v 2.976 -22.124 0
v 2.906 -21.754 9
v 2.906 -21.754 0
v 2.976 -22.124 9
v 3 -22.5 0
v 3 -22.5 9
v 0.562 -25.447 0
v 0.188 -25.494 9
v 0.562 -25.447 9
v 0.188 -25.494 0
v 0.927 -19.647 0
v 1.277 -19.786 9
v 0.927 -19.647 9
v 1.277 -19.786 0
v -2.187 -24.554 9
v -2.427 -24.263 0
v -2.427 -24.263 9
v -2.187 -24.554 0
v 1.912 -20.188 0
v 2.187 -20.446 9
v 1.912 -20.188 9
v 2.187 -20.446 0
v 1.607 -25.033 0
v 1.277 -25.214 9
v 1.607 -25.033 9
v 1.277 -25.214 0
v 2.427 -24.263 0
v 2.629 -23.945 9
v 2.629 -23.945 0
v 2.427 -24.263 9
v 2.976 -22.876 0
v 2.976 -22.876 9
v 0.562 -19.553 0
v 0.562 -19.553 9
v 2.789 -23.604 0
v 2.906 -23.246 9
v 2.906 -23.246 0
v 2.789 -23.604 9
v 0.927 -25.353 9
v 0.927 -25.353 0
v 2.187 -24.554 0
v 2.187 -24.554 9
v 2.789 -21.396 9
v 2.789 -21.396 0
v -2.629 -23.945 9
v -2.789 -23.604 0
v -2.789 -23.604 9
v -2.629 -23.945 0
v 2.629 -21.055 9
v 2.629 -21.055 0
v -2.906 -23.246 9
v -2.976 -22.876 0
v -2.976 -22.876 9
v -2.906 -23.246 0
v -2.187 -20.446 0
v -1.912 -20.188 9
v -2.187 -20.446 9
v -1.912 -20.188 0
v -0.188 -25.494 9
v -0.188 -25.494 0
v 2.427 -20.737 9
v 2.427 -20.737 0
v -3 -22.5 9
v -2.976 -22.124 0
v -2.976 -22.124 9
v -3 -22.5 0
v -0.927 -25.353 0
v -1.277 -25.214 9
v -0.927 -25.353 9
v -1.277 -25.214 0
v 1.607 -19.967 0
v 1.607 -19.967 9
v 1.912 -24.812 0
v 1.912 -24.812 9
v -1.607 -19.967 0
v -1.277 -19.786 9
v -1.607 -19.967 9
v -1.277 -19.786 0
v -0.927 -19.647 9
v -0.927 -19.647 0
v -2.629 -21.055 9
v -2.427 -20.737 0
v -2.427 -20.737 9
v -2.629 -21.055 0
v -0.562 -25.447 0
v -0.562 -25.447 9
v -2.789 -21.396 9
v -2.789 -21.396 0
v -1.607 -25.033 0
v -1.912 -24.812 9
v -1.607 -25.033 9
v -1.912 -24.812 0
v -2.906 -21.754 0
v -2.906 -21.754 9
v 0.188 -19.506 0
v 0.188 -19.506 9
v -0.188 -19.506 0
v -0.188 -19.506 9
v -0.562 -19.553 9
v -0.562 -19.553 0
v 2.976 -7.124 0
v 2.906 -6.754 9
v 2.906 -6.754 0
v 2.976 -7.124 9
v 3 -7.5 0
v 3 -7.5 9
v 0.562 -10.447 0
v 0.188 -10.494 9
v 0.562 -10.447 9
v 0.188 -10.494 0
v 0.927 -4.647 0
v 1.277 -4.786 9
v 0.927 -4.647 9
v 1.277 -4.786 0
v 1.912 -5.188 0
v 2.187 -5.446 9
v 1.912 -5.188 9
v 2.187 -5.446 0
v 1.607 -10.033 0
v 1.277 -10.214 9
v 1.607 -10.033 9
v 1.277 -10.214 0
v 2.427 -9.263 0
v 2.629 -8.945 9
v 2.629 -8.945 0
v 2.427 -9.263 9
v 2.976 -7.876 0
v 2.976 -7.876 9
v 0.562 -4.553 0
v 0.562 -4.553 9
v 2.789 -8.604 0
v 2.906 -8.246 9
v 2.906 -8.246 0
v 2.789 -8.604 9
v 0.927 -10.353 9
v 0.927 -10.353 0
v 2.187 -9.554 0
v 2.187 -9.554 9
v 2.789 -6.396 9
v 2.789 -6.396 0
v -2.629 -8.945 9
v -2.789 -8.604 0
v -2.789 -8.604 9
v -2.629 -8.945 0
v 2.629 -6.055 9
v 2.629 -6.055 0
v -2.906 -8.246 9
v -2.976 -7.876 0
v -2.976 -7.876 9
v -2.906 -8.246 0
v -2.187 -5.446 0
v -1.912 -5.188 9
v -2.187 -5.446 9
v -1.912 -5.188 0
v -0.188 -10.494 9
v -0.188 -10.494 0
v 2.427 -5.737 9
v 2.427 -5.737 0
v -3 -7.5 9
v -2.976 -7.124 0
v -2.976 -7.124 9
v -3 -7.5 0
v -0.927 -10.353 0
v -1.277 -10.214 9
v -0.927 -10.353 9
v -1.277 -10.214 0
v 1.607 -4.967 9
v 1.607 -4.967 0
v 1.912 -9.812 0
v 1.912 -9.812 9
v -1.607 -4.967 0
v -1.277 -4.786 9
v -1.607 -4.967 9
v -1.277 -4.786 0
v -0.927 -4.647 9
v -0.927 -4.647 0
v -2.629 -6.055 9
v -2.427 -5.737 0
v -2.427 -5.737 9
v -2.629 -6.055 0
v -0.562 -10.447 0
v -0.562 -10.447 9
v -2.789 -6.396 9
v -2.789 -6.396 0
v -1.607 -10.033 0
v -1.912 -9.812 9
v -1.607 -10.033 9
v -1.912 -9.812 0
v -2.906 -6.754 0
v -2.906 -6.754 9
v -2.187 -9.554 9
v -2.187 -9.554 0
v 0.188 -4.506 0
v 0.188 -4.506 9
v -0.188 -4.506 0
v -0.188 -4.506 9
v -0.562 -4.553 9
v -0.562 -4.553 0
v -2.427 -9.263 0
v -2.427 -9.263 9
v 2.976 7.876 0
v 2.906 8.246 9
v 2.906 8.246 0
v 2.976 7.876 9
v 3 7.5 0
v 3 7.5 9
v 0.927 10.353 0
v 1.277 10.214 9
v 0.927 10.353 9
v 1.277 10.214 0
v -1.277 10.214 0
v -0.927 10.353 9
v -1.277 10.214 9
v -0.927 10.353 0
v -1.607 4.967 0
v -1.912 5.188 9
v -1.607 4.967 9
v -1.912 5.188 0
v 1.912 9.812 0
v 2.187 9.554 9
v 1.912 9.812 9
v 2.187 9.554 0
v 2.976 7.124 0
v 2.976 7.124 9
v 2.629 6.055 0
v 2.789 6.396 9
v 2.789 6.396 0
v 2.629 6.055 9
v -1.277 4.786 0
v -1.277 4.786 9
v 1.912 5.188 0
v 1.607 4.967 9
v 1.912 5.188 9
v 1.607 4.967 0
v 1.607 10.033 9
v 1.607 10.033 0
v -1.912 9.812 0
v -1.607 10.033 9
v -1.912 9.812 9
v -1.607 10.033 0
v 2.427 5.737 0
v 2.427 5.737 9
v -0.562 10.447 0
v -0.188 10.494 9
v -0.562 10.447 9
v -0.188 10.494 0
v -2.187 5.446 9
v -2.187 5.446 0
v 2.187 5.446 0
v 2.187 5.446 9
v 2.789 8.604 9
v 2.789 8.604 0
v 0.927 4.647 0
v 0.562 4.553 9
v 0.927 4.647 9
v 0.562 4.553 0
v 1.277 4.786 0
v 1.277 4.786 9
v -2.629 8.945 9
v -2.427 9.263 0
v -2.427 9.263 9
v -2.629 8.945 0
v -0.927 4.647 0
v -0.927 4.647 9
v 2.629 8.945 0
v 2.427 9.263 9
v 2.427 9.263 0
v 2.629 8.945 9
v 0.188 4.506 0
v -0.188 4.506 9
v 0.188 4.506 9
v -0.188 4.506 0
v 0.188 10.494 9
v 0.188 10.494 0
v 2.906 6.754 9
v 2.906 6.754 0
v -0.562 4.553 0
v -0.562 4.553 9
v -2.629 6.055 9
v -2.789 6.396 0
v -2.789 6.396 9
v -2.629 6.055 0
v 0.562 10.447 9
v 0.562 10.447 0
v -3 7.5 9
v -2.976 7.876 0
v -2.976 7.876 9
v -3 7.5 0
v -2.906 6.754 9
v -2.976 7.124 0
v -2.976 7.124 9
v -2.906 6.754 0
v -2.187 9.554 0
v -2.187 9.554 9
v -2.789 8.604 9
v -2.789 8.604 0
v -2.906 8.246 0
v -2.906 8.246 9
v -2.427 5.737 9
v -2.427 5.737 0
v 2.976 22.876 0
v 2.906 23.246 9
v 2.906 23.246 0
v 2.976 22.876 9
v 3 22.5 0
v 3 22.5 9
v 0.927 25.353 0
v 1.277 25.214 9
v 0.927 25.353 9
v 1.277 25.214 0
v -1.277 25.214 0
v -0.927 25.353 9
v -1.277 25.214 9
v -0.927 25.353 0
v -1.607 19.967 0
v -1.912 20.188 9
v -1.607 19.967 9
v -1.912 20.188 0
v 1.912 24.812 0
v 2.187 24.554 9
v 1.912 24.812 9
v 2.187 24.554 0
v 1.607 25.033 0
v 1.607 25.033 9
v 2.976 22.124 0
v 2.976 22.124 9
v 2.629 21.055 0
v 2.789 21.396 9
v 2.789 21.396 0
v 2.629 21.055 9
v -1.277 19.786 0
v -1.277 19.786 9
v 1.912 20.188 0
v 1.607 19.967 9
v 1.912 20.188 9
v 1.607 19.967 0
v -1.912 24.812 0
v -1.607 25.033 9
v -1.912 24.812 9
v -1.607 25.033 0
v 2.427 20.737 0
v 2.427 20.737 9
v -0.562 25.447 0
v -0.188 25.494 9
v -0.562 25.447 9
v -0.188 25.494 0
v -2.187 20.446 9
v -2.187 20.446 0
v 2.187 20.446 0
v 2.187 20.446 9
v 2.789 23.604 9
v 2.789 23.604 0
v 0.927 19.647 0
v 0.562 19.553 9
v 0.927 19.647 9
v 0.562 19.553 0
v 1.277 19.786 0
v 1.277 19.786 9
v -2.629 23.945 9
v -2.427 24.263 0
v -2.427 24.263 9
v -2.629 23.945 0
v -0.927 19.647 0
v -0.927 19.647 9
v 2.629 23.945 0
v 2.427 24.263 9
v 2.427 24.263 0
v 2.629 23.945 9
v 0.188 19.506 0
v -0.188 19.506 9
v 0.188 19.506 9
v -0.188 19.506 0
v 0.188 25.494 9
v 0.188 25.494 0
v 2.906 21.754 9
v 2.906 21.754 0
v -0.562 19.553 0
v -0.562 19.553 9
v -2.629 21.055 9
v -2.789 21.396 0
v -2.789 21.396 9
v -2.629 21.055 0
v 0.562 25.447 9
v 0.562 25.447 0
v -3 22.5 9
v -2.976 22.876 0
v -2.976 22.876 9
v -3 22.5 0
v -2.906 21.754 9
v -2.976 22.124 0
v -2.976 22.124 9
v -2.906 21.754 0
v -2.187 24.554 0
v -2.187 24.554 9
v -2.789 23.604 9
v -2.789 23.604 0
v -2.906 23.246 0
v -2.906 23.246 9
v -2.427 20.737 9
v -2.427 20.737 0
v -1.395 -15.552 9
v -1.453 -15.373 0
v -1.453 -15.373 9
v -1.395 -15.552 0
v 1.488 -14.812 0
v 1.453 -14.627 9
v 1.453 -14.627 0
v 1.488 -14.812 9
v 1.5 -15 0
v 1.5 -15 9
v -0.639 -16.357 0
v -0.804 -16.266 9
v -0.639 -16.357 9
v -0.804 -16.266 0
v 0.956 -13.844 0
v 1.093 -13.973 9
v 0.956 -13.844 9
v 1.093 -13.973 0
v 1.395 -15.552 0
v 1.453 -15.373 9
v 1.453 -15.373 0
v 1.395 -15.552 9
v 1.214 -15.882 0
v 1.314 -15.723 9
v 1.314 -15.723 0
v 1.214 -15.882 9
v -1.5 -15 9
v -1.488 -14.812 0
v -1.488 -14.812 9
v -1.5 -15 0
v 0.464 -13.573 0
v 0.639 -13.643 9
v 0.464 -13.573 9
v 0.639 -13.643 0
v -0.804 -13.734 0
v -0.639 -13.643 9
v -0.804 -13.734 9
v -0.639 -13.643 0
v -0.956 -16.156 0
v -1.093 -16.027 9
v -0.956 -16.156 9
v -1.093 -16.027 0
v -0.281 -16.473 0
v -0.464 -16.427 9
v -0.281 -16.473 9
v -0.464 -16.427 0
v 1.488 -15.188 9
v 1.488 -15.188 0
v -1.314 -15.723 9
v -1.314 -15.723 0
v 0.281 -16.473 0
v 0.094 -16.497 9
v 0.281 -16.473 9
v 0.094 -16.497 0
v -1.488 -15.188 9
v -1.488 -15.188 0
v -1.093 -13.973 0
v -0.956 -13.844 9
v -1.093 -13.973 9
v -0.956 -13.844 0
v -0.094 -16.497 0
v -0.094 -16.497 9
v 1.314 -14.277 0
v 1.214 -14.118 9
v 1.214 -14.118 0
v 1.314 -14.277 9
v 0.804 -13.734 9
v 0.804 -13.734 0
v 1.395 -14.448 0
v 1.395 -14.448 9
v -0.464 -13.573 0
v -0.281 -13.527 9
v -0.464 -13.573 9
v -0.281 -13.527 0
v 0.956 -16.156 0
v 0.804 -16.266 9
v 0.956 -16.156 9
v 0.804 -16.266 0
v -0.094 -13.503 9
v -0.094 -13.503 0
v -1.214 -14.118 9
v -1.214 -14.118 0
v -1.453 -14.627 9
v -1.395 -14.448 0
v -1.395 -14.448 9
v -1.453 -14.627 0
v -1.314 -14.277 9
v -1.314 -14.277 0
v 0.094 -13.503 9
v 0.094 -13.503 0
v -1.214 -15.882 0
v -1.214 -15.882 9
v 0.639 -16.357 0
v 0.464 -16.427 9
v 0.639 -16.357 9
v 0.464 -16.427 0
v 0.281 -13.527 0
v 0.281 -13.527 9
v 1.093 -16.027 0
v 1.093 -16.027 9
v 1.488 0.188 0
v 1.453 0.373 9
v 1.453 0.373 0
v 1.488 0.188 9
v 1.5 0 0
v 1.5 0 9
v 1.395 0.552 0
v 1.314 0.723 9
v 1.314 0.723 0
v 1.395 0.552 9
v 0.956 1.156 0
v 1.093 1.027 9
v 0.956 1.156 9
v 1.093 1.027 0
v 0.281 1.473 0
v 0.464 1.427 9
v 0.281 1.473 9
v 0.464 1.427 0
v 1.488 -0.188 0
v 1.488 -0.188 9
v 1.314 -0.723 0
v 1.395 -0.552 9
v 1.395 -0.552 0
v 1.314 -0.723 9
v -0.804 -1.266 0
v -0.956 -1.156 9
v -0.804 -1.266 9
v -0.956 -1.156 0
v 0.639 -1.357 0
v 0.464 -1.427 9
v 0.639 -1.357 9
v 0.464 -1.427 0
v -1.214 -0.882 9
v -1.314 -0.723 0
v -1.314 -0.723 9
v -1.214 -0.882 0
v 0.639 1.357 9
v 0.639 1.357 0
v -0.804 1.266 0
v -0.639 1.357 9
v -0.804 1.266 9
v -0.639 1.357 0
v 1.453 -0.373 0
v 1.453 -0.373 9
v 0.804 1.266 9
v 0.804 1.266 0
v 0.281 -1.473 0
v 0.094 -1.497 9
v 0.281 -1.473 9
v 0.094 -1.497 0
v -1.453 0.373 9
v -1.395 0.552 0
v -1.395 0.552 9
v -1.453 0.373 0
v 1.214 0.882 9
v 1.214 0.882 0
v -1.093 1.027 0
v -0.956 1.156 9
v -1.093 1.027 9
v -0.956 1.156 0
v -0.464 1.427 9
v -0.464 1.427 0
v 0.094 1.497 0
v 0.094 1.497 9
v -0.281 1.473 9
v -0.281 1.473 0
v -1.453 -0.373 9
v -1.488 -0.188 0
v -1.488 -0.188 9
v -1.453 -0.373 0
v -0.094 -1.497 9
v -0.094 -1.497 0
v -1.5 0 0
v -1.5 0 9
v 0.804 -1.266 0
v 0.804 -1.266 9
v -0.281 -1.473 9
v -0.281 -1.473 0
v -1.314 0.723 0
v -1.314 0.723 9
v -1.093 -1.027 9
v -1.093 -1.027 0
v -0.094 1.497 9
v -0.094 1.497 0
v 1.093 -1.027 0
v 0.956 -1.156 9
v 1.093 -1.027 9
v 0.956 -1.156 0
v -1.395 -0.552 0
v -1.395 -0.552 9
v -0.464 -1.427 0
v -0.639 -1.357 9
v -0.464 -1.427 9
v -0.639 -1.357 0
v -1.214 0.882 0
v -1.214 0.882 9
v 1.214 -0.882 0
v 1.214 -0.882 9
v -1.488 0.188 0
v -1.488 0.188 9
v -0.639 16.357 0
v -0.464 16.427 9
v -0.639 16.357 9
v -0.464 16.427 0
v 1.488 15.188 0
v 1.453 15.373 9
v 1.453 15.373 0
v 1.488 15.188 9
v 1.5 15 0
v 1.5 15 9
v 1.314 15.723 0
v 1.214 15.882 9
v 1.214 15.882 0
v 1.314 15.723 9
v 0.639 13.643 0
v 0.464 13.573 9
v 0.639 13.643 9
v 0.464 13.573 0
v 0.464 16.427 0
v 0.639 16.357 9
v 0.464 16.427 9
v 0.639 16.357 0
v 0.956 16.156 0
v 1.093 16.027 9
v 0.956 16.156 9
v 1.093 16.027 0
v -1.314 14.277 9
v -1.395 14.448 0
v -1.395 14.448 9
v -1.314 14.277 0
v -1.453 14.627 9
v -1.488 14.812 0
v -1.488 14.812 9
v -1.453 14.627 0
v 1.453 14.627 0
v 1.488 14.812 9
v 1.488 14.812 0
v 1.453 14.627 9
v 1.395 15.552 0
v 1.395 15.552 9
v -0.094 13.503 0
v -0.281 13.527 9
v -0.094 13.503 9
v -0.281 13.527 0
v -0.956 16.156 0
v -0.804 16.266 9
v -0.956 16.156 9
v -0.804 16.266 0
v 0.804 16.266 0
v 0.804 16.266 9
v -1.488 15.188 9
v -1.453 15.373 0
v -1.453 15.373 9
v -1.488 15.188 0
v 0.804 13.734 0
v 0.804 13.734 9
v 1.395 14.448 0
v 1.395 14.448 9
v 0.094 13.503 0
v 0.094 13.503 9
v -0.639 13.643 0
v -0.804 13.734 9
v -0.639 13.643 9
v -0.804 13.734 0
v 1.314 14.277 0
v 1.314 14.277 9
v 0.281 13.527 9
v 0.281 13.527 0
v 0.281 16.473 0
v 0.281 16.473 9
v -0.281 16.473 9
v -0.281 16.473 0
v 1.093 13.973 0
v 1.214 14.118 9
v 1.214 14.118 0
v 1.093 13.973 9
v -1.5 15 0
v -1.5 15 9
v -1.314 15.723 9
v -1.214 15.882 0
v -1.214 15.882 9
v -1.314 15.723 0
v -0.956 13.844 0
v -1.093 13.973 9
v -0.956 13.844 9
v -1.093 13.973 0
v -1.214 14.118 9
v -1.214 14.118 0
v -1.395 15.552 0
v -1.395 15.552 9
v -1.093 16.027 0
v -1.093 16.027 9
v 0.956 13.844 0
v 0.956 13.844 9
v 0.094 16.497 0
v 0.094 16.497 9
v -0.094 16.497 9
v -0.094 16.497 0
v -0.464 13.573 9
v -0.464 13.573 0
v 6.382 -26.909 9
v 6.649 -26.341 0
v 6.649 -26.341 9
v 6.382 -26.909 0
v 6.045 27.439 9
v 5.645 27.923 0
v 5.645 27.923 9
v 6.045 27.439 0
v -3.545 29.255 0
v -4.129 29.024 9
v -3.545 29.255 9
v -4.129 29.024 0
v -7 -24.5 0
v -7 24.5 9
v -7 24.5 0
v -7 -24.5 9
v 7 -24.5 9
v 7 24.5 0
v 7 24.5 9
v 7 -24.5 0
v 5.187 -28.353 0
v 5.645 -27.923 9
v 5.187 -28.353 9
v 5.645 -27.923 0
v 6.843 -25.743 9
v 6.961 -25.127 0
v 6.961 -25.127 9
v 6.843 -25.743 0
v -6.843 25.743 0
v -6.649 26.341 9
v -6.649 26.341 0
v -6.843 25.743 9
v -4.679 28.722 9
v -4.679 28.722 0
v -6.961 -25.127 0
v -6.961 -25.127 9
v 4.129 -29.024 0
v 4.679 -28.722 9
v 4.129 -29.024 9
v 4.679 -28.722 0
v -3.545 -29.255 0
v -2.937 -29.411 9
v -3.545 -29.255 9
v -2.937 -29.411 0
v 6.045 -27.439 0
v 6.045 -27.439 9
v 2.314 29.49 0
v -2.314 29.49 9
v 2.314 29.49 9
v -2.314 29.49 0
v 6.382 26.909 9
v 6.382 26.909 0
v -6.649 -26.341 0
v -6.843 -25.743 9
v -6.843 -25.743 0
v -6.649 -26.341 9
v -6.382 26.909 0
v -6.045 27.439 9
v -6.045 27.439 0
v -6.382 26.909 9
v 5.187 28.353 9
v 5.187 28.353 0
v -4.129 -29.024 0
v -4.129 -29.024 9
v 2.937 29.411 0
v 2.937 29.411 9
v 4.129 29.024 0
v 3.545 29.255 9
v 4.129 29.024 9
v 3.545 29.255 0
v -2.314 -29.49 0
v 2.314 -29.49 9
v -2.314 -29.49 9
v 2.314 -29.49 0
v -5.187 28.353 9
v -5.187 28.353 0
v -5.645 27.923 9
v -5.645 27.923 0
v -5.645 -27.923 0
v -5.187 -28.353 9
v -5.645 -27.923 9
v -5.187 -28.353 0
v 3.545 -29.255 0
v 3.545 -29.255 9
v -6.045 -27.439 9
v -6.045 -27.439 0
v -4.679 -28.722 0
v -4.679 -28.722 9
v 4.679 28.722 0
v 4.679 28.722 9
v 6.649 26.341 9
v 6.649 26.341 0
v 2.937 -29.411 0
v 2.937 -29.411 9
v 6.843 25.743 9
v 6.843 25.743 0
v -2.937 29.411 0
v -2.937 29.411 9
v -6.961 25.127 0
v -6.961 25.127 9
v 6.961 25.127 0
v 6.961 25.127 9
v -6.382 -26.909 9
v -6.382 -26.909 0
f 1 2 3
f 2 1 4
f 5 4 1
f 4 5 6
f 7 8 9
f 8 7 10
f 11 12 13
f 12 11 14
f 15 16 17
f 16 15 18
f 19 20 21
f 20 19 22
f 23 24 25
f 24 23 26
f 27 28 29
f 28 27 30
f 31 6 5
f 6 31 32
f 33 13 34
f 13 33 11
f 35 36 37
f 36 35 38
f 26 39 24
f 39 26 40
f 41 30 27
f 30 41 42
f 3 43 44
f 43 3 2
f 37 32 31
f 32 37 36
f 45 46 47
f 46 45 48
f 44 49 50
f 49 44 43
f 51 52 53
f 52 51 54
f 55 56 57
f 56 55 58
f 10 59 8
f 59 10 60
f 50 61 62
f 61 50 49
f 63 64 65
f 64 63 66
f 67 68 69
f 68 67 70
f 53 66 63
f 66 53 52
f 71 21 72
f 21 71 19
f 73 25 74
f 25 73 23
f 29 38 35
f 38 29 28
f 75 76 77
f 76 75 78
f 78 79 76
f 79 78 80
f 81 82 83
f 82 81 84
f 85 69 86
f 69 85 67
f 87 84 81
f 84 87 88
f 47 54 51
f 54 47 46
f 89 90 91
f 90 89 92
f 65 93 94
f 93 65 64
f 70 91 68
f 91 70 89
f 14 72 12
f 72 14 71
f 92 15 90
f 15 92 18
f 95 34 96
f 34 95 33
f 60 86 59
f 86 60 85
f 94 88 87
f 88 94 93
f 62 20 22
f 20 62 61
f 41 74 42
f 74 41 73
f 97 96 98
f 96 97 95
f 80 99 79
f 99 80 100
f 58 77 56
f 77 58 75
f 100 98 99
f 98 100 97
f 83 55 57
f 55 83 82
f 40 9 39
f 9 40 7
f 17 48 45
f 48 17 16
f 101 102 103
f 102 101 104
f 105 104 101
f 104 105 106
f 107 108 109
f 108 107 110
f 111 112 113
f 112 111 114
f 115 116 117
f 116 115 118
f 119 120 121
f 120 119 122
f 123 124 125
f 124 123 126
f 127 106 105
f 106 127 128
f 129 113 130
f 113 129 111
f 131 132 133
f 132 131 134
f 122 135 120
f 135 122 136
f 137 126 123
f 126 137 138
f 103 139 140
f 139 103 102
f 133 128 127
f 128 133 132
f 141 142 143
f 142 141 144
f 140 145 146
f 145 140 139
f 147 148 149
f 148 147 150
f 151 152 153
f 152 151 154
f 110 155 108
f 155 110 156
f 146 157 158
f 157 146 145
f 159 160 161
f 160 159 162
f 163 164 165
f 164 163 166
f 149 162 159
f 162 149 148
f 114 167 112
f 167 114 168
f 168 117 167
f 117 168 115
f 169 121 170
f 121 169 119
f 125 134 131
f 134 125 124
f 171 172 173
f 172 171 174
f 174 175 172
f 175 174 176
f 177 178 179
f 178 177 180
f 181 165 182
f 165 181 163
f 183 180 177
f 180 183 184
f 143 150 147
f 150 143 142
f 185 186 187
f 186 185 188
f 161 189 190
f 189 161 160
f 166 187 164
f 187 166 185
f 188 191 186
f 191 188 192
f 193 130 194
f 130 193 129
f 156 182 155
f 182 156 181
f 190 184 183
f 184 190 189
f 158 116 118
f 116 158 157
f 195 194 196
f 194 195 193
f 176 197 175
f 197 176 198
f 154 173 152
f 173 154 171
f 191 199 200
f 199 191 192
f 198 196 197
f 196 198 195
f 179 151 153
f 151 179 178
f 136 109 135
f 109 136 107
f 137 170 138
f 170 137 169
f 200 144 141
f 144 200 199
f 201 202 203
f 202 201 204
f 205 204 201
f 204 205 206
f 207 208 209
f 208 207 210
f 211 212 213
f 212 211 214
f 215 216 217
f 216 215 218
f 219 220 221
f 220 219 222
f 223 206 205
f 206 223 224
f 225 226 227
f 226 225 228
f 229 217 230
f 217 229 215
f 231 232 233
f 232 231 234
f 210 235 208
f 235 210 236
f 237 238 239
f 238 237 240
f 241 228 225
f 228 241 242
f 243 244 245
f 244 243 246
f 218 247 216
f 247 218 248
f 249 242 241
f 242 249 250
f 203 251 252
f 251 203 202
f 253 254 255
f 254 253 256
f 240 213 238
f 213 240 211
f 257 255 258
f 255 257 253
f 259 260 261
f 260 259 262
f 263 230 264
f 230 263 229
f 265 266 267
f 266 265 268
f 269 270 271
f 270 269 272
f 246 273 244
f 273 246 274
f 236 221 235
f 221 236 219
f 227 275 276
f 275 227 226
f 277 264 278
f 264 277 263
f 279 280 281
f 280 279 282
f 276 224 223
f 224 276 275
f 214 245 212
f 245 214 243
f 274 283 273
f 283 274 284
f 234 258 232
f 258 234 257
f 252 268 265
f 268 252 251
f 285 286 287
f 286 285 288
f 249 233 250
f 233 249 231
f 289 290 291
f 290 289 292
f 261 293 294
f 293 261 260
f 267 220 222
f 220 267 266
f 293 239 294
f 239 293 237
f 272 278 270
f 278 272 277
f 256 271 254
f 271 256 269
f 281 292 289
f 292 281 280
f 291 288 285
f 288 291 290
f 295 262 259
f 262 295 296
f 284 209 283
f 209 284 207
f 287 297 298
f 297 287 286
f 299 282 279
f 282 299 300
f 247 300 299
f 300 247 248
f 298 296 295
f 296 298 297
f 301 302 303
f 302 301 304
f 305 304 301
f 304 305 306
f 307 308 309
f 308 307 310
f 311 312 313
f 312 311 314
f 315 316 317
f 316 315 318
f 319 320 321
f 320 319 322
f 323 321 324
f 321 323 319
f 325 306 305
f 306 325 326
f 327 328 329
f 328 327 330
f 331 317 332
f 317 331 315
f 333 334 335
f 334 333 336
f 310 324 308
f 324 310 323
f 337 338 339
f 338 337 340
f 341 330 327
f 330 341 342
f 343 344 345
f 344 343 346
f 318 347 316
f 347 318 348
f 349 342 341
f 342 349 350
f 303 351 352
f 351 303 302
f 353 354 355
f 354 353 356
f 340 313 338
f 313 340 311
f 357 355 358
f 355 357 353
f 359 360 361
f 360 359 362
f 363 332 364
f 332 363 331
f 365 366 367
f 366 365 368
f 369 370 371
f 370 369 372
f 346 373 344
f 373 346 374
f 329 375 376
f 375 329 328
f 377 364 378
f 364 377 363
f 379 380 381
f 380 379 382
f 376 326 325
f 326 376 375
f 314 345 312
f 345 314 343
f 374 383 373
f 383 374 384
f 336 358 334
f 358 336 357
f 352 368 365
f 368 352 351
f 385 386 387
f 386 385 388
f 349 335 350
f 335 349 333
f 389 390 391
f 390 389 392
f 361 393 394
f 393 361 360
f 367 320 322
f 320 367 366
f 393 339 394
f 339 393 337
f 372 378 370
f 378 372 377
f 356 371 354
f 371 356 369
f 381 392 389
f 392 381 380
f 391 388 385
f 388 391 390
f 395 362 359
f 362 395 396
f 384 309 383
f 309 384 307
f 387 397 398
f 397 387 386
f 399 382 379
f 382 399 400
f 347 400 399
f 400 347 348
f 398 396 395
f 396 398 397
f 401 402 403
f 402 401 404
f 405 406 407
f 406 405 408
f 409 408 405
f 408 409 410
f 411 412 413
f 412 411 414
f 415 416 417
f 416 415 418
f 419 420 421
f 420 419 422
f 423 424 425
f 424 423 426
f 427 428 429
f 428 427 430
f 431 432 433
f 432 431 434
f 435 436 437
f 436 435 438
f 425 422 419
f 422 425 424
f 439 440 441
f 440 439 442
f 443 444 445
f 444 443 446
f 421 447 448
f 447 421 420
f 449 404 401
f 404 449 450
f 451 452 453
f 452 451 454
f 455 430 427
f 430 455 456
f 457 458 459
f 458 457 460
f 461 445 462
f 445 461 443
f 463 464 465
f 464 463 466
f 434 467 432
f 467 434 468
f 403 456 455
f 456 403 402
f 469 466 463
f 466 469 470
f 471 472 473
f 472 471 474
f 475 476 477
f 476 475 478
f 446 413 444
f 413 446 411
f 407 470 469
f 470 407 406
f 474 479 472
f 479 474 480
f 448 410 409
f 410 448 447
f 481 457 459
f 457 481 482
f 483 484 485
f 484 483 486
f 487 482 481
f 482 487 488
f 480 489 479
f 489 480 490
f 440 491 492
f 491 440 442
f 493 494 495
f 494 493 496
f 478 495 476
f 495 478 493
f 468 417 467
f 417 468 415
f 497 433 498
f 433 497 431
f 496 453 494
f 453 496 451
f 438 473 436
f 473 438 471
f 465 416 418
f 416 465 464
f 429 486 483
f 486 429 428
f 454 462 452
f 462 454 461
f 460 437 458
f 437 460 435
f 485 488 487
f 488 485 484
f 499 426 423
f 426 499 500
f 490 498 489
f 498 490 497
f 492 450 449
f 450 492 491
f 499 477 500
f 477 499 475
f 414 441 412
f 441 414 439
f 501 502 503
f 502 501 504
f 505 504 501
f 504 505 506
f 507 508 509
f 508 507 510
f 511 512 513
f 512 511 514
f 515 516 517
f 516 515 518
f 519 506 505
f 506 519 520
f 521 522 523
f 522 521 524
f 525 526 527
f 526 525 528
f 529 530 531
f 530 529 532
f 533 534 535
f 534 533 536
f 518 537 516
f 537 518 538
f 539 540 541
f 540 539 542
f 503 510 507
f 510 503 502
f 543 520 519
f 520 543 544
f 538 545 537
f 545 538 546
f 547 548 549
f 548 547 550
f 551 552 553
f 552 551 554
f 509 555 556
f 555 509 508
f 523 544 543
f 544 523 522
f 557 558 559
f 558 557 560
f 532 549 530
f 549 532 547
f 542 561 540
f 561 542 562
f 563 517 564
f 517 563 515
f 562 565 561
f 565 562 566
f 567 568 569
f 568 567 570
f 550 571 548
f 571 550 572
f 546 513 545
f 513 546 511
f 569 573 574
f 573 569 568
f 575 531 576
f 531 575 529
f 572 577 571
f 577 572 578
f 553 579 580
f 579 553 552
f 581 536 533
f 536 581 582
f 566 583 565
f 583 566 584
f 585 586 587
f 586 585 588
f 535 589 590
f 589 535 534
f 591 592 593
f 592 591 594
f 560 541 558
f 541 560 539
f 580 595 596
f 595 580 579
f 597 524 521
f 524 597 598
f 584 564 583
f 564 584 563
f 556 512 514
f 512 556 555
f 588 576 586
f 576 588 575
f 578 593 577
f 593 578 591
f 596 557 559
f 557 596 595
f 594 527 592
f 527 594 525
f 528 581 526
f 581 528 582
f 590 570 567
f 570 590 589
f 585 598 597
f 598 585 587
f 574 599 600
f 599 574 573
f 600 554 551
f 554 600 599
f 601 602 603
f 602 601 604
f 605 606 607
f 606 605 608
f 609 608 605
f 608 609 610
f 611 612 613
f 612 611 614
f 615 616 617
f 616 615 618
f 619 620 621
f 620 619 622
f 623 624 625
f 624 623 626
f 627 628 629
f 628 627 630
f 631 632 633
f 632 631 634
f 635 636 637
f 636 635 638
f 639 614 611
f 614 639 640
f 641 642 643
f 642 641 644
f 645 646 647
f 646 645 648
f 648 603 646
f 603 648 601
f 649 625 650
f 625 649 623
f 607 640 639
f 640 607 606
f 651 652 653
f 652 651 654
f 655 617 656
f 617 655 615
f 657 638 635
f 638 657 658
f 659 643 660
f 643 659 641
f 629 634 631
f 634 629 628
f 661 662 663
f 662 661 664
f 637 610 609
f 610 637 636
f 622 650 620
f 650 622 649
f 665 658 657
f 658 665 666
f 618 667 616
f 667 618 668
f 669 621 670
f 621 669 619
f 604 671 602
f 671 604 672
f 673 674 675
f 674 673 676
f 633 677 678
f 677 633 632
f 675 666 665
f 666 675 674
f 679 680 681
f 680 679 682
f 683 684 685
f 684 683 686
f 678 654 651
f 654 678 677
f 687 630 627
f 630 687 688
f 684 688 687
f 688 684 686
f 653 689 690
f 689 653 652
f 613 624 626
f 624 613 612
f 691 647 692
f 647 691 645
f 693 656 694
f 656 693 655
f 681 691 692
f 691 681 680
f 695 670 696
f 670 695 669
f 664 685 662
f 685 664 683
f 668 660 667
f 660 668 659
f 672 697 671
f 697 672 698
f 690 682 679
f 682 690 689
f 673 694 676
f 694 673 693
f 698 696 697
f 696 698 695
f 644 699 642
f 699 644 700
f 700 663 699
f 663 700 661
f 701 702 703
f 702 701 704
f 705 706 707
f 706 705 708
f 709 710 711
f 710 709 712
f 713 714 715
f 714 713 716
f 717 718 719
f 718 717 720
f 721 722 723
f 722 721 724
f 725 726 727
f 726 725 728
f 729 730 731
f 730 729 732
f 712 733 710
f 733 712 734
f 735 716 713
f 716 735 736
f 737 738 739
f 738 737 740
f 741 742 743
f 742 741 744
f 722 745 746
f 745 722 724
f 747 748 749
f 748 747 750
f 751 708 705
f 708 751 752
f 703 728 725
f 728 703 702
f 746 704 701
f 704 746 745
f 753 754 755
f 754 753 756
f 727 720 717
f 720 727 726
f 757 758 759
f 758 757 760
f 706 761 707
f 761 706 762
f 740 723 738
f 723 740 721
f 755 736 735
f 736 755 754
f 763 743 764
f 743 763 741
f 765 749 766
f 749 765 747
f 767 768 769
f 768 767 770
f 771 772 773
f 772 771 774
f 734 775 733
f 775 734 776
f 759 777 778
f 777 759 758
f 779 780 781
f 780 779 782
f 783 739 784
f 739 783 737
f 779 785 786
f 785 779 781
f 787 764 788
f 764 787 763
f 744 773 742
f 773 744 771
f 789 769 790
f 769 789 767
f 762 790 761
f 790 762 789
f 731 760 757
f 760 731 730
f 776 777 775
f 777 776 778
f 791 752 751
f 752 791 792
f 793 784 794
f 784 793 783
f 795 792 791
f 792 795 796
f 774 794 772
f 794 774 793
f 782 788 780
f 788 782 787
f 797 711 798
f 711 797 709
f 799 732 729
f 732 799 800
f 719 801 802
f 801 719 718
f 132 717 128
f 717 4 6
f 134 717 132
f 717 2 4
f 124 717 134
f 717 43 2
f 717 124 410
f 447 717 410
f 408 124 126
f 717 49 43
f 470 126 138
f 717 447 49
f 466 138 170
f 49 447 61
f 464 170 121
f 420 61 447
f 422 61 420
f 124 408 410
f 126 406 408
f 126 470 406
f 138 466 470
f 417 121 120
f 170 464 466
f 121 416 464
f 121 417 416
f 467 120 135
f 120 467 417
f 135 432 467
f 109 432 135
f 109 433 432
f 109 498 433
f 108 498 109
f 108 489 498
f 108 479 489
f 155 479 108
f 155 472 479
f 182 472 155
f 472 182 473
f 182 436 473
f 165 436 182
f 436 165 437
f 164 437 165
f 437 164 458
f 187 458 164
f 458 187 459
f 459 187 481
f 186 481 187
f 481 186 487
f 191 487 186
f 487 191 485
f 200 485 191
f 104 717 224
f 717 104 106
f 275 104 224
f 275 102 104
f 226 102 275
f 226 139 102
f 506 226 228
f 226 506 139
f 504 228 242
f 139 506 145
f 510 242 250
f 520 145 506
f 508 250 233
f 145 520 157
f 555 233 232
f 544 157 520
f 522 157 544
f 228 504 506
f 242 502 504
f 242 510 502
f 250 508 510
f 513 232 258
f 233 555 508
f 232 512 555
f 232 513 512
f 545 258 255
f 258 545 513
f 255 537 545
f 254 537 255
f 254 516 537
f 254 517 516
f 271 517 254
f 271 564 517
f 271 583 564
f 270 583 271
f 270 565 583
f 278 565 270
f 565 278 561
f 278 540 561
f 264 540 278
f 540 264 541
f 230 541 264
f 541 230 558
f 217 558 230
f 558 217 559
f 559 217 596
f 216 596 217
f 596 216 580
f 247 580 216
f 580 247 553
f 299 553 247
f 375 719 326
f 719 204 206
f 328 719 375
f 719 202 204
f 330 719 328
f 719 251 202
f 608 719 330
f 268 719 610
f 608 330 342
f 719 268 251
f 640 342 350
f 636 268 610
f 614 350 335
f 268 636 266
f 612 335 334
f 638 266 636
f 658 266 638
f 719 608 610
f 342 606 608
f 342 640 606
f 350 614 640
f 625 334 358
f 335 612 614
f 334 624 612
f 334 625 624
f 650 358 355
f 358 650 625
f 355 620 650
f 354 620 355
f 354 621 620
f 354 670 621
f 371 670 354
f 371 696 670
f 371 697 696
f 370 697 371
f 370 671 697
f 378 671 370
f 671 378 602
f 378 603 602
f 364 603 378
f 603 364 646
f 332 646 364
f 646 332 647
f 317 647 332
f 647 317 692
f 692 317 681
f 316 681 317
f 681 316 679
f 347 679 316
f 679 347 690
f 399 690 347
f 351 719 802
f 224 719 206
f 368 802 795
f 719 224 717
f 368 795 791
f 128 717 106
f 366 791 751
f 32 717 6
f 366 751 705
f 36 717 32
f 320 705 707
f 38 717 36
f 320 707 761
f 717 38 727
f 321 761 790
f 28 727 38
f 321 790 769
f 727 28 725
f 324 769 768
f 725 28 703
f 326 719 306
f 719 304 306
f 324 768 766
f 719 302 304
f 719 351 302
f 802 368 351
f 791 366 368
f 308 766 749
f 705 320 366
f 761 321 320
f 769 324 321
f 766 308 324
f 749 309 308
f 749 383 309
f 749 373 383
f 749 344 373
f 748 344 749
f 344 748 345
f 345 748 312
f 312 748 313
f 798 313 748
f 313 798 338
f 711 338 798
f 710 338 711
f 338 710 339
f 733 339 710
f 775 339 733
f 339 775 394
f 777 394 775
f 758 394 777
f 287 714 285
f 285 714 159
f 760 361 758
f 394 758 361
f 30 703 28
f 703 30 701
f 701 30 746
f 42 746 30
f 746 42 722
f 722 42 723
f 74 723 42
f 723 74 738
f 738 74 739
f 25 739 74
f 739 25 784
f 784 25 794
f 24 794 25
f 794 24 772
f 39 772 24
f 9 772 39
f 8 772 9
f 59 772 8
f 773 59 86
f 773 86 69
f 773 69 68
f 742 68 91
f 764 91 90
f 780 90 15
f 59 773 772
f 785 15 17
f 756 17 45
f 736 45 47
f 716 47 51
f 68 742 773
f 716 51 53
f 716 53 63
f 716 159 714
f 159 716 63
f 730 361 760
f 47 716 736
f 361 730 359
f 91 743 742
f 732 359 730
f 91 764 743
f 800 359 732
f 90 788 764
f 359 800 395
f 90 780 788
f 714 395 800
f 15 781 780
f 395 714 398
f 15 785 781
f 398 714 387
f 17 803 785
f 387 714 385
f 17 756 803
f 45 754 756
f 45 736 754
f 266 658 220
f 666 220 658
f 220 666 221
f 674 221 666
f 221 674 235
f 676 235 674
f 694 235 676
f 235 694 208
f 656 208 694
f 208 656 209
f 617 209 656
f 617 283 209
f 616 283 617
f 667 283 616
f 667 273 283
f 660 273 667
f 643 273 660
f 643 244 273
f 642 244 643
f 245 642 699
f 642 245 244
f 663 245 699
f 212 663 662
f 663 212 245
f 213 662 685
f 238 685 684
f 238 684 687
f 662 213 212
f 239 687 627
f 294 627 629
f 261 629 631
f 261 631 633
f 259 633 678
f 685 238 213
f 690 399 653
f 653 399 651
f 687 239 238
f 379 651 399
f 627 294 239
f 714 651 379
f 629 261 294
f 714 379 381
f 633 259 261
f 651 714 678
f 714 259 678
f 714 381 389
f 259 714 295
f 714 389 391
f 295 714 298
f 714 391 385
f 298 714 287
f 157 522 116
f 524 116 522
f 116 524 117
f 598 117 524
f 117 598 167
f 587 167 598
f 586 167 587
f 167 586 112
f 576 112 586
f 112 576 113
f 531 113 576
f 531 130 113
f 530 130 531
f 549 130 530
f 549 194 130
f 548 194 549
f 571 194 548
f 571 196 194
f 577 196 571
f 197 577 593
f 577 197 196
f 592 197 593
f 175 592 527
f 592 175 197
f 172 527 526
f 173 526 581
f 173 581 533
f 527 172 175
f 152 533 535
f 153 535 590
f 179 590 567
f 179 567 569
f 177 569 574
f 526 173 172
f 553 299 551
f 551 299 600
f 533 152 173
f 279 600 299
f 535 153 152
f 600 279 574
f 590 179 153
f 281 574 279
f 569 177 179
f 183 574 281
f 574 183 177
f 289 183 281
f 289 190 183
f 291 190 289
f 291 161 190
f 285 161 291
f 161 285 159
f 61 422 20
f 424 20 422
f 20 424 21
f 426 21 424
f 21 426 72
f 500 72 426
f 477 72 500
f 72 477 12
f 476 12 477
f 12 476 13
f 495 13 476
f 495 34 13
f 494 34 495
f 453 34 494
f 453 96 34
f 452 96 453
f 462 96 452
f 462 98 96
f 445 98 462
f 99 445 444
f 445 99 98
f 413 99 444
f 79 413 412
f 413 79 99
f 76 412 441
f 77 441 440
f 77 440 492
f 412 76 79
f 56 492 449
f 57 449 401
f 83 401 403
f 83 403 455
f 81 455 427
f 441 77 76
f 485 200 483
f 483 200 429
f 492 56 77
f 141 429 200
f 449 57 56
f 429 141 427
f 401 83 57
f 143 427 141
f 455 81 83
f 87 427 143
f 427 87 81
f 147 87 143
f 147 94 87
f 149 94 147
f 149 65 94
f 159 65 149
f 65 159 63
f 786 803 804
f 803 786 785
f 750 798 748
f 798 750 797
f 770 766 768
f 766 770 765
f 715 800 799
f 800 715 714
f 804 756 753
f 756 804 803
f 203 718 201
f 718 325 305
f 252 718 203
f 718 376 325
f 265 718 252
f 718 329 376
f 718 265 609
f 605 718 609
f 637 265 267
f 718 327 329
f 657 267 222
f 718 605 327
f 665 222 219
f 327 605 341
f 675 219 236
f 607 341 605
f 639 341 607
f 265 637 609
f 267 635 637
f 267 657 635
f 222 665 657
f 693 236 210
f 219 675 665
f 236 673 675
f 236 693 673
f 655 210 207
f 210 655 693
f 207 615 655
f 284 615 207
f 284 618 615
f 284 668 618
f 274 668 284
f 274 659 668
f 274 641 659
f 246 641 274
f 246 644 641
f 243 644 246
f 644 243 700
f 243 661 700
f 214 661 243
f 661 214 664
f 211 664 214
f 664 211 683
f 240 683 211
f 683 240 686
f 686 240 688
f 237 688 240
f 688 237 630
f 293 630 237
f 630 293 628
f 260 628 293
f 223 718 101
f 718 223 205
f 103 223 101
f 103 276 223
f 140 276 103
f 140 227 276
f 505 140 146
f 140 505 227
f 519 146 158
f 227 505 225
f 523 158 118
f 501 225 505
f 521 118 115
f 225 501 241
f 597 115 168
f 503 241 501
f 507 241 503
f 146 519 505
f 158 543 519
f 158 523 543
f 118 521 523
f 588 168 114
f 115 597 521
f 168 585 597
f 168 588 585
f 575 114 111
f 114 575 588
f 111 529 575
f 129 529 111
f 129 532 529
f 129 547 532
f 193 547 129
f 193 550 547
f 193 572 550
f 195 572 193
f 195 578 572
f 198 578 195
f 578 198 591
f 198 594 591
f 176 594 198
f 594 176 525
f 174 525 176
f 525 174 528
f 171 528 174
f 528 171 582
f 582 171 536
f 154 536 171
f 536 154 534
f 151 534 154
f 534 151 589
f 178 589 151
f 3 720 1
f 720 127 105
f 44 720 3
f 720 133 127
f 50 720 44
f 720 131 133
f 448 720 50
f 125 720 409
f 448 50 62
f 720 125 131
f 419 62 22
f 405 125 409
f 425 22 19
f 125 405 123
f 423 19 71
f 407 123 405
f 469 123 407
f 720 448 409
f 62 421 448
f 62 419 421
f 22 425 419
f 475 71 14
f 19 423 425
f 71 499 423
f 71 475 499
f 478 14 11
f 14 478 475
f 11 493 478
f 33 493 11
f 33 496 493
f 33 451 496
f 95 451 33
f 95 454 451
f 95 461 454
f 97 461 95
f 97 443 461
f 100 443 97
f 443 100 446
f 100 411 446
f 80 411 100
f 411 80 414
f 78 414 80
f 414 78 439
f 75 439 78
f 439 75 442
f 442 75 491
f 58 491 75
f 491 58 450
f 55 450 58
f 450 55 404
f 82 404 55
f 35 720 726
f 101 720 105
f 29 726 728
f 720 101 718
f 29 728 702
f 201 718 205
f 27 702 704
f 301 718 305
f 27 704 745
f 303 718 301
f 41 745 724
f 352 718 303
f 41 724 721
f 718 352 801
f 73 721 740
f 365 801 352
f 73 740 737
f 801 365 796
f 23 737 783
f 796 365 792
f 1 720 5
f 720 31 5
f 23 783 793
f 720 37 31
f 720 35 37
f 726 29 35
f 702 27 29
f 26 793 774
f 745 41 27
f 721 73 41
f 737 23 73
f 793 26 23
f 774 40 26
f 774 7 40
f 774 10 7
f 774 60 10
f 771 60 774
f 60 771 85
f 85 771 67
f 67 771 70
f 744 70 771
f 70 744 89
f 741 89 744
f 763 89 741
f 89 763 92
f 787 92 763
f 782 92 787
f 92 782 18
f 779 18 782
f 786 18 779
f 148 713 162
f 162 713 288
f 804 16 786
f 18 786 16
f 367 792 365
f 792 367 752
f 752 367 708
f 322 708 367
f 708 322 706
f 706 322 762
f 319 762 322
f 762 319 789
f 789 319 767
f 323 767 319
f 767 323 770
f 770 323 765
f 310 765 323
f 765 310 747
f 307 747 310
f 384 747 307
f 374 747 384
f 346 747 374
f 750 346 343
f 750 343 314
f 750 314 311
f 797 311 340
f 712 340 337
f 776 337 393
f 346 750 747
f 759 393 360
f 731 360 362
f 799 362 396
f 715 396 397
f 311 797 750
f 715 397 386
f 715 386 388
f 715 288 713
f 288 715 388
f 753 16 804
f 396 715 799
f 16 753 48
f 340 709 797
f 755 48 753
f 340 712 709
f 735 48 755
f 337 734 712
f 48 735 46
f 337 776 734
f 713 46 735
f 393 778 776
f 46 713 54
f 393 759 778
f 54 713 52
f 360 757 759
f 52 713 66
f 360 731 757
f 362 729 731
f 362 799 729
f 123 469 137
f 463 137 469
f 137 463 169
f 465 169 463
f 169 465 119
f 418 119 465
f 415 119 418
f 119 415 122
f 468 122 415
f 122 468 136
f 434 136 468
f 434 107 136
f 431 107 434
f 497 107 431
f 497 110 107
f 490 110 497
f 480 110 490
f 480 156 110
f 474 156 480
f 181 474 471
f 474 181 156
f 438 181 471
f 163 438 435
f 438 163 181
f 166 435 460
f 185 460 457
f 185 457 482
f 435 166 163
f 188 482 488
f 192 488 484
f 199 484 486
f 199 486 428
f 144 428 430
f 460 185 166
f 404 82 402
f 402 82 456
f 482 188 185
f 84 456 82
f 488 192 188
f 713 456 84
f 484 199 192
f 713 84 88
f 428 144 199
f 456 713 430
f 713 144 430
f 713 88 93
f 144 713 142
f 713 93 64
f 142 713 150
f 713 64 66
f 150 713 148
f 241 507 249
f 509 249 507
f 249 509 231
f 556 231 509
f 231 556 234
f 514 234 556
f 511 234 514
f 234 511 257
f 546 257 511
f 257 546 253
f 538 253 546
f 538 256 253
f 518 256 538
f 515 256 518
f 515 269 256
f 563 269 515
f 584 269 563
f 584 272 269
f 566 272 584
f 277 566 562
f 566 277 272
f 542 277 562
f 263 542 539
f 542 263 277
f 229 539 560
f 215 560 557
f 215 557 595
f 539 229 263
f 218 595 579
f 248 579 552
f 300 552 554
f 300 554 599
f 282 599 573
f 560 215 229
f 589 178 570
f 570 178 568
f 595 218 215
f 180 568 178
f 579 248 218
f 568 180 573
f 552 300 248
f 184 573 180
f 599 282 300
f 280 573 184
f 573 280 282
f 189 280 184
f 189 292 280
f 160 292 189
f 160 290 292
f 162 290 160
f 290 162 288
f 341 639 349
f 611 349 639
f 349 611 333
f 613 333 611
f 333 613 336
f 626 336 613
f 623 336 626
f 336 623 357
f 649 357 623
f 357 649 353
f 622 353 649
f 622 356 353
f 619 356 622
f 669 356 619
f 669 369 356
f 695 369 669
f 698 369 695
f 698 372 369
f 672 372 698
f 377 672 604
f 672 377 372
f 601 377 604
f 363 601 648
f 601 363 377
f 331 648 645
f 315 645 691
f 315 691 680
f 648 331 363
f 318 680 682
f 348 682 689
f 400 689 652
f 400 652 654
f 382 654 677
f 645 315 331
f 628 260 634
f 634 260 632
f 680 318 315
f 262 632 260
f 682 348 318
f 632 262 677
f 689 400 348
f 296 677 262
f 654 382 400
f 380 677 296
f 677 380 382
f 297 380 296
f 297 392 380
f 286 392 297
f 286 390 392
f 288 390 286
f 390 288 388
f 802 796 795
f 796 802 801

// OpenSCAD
$fn = 50;

difference() {
	union() {
		hull() {
			translate(v = [-2.0, 24.5, 0]) {
				cylinder(h = 9, r = 5);
			}
			translate(v = [2.0, 24.5, 0]) {
				cylinder(h = 9, r = 5);
			}
			translate(v = [-2.0, -24.5, 0]) {
				cylinder(h = 9, r = 5);
			}
			translate(v = [2.0, -24.5, 0]) {
				cylinder(h = 9, r = 5);
			}
		}
	}
	union() {
		translate(v = [0.0, -22.5, 0]) {
			translate(v = [0, 0, -100]) {
				cylinder(h = 200, r = 3.0);
			}
		}
		translate(v = [0.0, -7.5, 0]) {
			translate(v = [0, 0, -100]) {
				cylinder(h = 200, r = 3.0);
			}
		}
		translate(v = [0.0, 7.5, 0]) {
			translate(v = [0, 0, -100]) {
				cylinder(h = 200, r = 3.0);
			}
		}
		translate(v = [0.0, 22.5, 0]) {
			translate(v = [0, 0, -100]) {
				cylinder(h = 200, r = 3.0);
			}
		}
		translate(v = [0.0, -22.5, 0]) {
			translate(v = [0, 0, -100]) {
				cylinder(h = 200, r = 1.5);
			}
		}
		translate(v = [0.0, -15.0, 0]) {
			translate(v = [0, 0, -100]) {
				cylinder(h = 200, r = 1.5);
			}
		}
		translate(v = [0.0, -7.5, 0]) {
			translate(v = [0, 0, -100]) {
				cylinder(h = 200, r = 1.5);
			}
		}
		translate(v = [0, 0, -100]) {
			cylinder(h = 200, r = 1.5);
		}
		translate(v = [0.0, 7.5, 0]) {
			translate(v = [0, 0, -100]) {
				cylinder(h = 200, r = 1.5);
			}
		}
		translate(v = [0.0, 15.0, 0]) {
			translate(v = [0, 0, -100]) {
				cylinder(h = 200, r = 1.5);
			}
		}
		translate(v = [0.0, 22.5, 0]) {
			translate(v = [0, 0, -100]) {
				cylinder(h = 200, r = 1.5);
			}
		}
	}
}
